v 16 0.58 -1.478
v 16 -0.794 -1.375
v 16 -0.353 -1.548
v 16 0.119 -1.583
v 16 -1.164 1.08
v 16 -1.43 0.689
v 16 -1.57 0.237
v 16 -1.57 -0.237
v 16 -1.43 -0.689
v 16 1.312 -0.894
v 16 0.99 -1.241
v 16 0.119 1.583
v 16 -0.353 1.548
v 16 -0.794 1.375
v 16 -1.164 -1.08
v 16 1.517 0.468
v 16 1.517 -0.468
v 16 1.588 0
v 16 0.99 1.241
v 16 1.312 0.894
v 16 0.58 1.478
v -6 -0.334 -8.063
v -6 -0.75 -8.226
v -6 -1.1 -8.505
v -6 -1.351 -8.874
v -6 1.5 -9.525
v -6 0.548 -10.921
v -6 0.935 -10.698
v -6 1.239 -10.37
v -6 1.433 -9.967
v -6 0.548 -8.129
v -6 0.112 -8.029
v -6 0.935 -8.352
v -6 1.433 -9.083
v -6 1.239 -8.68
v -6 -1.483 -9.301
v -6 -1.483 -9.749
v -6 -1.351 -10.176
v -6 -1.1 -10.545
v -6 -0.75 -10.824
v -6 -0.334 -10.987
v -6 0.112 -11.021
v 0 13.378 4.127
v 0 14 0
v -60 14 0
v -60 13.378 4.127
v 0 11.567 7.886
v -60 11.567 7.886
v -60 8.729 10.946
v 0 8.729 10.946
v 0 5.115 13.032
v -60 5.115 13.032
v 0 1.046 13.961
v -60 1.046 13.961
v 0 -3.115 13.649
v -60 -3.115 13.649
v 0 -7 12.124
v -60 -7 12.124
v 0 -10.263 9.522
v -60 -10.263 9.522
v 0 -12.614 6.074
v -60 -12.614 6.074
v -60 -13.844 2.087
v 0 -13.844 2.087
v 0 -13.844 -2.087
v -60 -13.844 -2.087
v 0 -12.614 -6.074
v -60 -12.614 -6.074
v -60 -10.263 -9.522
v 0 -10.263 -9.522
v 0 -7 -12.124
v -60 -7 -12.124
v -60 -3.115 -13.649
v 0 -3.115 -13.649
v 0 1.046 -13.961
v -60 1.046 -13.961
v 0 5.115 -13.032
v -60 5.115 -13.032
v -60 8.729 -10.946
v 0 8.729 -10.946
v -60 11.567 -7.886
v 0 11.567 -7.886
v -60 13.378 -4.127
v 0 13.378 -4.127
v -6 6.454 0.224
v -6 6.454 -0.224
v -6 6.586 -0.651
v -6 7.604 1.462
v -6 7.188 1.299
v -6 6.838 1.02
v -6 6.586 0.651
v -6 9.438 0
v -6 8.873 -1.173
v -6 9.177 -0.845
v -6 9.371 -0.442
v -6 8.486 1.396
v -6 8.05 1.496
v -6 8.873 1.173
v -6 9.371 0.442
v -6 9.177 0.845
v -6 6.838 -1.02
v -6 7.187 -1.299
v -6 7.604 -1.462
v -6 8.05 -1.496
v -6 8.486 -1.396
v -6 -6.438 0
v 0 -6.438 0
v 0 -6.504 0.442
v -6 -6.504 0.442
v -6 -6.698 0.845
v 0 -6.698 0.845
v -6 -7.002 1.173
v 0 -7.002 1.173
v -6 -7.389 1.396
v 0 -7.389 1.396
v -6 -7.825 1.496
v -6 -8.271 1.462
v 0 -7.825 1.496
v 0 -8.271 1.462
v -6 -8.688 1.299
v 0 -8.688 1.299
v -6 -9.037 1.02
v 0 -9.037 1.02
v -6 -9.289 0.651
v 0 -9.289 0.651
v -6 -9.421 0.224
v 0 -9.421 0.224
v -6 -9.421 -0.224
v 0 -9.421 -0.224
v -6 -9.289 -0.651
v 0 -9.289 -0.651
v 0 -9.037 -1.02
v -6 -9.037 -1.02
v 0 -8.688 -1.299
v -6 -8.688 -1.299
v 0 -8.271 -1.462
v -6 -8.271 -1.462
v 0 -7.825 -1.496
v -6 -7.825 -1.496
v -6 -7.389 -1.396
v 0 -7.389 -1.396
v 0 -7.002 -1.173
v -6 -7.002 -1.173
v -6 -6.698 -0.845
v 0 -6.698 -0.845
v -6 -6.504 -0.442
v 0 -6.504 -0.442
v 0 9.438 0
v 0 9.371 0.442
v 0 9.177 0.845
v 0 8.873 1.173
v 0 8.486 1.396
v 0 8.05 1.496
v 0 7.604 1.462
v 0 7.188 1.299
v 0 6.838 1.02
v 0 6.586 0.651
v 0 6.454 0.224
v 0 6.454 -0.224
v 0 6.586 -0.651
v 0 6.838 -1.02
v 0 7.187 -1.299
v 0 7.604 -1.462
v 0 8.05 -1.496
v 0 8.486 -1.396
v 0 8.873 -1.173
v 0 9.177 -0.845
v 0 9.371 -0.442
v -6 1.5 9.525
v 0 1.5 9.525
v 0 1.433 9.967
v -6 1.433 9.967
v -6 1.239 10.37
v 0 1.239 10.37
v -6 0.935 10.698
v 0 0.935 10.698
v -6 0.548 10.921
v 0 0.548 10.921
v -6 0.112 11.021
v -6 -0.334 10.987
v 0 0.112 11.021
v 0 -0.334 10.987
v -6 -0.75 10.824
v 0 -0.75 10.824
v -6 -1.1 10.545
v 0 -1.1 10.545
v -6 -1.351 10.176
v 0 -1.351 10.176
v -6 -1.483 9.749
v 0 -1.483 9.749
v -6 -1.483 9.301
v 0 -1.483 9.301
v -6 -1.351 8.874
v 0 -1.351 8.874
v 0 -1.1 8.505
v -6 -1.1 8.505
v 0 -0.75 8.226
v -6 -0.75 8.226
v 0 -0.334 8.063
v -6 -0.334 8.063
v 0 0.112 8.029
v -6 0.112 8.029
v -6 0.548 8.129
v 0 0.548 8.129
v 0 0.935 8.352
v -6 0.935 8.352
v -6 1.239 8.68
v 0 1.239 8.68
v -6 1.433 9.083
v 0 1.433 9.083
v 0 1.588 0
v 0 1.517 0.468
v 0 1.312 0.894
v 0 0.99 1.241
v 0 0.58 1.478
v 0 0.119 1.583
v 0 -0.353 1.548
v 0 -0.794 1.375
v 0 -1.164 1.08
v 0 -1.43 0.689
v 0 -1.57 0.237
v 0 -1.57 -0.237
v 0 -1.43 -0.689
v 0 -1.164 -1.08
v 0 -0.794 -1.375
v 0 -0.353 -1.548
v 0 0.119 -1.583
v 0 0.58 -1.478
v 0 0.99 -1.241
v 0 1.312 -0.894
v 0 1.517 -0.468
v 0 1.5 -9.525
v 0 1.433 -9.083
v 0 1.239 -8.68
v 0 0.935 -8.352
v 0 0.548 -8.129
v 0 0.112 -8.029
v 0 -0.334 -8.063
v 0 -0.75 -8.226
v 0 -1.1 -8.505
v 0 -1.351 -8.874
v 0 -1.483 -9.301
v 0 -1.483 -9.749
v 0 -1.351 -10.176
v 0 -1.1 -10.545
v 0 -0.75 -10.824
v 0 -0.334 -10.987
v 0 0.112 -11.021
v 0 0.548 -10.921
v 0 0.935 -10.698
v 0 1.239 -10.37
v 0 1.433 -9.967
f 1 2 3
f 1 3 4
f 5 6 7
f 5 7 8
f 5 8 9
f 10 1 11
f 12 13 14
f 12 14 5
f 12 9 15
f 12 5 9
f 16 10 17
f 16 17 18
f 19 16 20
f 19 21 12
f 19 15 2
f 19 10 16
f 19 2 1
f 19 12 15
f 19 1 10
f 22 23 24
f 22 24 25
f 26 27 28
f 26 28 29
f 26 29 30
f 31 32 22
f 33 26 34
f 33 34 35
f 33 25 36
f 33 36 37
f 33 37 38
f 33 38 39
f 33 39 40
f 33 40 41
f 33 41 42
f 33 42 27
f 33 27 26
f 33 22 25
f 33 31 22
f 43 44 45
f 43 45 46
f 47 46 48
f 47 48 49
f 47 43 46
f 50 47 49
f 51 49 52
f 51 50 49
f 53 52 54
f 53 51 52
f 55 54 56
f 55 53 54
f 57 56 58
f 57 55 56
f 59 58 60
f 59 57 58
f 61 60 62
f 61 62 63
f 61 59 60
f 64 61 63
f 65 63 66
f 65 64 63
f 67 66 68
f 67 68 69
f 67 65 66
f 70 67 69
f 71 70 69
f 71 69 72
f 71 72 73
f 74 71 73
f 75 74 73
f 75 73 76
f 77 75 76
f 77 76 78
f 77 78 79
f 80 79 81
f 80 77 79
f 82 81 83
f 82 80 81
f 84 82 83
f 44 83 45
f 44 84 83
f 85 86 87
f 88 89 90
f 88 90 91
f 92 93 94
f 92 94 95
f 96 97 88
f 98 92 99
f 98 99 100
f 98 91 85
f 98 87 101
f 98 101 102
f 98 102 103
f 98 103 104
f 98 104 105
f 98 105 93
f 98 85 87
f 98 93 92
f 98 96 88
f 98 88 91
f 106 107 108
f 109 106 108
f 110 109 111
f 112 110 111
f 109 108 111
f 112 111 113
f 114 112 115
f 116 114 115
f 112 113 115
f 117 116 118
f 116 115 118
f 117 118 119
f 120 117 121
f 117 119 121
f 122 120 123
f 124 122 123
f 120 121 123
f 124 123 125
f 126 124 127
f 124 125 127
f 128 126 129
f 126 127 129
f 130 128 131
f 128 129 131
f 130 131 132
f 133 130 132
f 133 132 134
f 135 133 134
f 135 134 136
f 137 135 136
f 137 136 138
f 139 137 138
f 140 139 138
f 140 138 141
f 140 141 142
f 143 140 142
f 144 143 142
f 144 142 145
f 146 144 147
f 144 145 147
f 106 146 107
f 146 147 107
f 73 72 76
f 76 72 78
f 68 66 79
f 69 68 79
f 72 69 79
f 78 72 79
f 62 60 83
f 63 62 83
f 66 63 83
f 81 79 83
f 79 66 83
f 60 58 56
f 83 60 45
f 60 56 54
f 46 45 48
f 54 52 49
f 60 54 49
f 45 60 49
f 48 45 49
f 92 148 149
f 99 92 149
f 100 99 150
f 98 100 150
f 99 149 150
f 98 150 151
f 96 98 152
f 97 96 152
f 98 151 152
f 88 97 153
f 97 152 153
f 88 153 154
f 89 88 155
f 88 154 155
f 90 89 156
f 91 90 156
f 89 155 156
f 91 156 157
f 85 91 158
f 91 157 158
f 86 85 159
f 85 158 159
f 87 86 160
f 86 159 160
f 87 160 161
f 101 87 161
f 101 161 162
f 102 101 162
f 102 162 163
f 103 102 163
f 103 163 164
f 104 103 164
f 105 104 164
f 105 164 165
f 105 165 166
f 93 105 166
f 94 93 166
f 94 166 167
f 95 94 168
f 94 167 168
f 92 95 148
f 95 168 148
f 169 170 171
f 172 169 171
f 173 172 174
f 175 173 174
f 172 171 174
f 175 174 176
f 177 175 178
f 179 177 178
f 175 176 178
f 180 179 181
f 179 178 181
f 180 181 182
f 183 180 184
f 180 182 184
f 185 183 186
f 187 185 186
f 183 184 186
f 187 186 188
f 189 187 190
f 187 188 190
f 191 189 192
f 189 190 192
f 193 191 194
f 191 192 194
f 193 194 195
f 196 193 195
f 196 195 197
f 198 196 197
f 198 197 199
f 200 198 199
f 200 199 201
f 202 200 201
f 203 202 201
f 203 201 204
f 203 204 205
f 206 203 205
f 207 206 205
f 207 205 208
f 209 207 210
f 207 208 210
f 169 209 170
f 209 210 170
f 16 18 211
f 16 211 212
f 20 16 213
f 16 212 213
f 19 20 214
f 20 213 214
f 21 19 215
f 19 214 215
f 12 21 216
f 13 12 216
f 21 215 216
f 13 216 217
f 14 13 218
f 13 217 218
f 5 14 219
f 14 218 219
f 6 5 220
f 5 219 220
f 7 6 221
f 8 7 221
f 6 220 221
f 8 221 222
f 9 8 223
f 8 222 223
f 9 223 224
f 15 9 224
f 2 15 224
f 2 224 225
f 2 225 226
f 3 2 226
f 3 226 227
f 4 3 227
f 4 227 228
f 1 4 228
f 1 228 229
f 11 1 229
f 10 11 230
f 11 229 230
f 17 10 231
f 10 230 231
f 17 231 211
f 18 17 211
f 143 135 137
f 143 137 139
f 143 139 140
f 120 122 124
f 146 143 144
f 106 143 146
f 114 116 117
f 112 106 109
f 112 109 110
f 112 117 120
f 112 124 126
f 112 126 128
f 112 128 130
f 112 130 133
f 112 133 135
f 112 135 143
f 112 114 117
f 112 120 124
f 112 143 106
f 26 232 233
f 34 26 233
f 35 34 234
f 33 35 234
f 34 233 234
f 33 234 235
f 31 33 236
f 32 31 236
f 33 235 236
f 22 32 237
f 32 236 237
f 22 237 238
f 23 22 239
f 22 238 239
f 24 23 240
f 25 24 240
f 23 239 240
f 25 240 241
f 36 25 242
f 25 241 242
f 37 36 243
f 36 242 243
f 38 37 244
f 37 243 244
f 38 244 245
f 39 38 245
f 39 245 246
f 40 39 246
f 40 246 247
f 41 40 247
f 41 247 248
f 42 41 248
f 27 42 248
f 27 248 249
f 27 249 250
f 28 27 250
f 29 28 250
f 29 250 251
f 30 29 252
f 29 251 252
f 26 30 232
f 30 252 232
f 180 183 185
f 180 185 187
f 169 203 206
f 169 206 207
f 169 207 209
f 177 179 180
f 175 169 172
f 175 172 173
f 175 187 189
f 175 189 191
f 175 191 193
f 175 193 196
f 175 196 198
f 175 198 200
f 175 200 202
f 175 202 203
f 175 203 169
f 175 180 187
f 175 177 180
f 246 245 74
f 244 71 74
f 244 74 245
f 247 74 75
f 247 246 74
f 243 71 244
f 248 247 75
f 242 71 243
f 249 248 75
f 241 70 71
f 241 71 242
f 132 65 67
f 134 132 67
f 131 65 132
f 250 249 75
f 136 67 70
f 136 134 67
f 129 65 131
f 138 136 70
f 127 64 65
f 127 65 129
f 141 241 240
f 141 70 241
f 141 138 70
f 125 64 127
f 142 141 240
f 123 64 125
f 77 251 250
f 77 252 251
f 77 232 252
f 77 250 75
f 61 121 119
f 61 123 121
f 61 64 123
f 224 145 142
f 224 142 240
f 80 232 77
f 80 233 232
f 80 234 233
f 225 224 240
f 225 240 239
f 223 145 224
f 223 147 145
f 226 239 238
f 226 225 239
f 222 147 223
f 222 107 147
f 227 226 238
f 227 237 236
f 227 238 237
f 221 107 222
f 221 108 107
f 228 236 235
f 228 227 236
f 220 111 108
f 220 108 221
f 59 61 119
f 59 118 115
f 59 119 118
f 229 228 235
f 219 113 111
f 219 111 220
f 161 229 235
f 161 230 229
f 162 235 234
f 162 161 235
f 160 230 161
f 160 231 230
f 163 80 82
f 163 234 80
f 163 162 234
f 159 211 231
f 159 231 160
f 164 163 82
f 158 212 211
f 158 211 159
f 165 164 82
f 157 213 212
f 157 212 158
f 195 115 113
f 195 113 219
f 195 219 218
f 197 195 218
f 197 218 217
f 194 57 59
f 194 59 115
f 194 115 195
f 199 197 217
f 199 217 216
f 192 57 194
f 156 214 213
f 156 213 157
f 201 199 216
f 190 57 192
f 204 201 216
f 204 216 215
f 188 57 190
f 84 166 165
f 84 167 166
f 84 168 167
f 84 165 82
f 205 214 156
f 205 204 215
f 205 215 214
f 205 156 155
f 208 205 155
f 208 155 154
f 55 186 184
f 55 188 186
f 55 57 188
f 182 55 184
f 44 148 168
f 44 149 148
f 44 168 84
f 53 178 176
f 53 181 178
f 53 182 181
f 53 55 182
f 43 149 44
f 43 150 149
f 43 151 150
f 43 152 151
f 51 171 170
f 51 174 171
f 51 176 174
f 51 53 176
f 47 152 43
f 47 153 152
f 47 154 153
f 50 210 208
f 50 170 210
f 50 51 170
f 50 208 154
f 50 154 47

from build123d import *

# Parameters (mm, degrees)
F0_R     = 14
F1_DEPTH = 60
F2_R     = 1.5875
F3_DEPTH = 16
F4_R     = 1.5
F5_DEPTH = 6


with BuildPart() as f1:
    # F0 (on Right) → F1 (new body)
    with BuildSketch(Plane.YZ):
        Circle(F0_R)
    extrude(amount=-F1_DEPTH)

    # F2 (on face) → F3 (join)
    with BuildSketch(Plane.YZ):
        Circle(F2_R)
    extrude(amount=F3_DEPTH)

    # F4 (on face) → F5 (cut)
    with BuildSketch(Plane.YZ):
        with Locations((0, 9.525)):
            Circle(F4_R)
        with Locations((7.9375, 0)):
            Circle(F4_R)
        with Locations((0, -9.525)):
            Circle(F4_R)
        with Locations((-7.9375, 0)):
            Circle(F4_R)
    extrude(amount=-F5_DEPTH, mode=Mode.SUBTRACT)


solid = f1.part
